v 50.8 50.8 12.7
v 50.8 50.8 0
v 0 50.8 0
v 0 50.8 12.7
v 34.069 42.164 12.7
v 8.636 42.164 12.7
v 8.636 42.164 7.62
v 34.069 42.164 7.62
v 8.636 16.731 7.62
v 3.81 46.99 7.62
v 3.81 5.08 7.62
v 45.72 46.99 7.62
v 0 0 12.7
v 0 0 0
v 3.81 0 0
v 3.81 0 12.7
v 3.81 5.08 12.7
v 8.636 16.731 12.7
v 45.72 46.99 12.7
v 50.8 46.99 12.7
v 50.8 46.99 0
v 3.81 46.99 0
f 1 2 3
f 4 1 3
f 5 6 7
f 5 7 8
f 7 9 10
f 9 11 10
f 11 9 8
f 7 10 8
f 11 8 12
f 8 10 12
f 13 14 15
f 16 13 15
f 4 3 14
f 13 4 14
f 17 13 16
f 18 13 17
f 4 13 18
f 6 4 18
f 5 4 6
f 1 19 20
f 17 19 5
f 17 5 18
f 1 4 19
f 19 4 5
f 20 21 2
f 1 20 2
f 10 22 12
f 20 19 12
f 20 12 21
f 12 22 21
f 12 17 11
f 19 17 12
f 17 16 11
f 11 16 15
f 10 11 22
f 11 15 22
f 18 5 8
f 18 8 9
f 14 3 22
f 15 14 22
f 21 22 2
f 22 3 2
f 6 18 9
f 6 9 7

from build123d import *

# Parameters (mm, degrees)
F0_W     = 46.99
F0_H     = 3.81
F1_DEPTH = 12.7
F3_DEPTH = 5.08


with BuildPart() as f1:
    # F0 (on Top) → F1 (new body)
    with BuildSketch(Plane.XY):
        Polygon((0, 50.8), (0, 0), (3.81, 0), (3.81, 46.99), (3.81, 50.8), align=None)
        with Locations((27.305, 48.895)):
            Rectangle(F0_W, F0_H)
    extrude(amount=F1_DEPTH)

    # F2 (on face) → F3 (join)
    with BuildSketch(Plane.XY.offset(12.7)):
        Polygon((45.72, 46.99), (3.81, 46.99), (3.81, 5.08), align=None)
        Polygon((8.6359983861, 42.1640016139), (34.0690092442, 42.1640016139), (8.6359983861, 16.7309907558), align=None, mode=Mode.SUBTRACT)
    extrude(amount=-F3_DEPTH)


solid = f1.part
